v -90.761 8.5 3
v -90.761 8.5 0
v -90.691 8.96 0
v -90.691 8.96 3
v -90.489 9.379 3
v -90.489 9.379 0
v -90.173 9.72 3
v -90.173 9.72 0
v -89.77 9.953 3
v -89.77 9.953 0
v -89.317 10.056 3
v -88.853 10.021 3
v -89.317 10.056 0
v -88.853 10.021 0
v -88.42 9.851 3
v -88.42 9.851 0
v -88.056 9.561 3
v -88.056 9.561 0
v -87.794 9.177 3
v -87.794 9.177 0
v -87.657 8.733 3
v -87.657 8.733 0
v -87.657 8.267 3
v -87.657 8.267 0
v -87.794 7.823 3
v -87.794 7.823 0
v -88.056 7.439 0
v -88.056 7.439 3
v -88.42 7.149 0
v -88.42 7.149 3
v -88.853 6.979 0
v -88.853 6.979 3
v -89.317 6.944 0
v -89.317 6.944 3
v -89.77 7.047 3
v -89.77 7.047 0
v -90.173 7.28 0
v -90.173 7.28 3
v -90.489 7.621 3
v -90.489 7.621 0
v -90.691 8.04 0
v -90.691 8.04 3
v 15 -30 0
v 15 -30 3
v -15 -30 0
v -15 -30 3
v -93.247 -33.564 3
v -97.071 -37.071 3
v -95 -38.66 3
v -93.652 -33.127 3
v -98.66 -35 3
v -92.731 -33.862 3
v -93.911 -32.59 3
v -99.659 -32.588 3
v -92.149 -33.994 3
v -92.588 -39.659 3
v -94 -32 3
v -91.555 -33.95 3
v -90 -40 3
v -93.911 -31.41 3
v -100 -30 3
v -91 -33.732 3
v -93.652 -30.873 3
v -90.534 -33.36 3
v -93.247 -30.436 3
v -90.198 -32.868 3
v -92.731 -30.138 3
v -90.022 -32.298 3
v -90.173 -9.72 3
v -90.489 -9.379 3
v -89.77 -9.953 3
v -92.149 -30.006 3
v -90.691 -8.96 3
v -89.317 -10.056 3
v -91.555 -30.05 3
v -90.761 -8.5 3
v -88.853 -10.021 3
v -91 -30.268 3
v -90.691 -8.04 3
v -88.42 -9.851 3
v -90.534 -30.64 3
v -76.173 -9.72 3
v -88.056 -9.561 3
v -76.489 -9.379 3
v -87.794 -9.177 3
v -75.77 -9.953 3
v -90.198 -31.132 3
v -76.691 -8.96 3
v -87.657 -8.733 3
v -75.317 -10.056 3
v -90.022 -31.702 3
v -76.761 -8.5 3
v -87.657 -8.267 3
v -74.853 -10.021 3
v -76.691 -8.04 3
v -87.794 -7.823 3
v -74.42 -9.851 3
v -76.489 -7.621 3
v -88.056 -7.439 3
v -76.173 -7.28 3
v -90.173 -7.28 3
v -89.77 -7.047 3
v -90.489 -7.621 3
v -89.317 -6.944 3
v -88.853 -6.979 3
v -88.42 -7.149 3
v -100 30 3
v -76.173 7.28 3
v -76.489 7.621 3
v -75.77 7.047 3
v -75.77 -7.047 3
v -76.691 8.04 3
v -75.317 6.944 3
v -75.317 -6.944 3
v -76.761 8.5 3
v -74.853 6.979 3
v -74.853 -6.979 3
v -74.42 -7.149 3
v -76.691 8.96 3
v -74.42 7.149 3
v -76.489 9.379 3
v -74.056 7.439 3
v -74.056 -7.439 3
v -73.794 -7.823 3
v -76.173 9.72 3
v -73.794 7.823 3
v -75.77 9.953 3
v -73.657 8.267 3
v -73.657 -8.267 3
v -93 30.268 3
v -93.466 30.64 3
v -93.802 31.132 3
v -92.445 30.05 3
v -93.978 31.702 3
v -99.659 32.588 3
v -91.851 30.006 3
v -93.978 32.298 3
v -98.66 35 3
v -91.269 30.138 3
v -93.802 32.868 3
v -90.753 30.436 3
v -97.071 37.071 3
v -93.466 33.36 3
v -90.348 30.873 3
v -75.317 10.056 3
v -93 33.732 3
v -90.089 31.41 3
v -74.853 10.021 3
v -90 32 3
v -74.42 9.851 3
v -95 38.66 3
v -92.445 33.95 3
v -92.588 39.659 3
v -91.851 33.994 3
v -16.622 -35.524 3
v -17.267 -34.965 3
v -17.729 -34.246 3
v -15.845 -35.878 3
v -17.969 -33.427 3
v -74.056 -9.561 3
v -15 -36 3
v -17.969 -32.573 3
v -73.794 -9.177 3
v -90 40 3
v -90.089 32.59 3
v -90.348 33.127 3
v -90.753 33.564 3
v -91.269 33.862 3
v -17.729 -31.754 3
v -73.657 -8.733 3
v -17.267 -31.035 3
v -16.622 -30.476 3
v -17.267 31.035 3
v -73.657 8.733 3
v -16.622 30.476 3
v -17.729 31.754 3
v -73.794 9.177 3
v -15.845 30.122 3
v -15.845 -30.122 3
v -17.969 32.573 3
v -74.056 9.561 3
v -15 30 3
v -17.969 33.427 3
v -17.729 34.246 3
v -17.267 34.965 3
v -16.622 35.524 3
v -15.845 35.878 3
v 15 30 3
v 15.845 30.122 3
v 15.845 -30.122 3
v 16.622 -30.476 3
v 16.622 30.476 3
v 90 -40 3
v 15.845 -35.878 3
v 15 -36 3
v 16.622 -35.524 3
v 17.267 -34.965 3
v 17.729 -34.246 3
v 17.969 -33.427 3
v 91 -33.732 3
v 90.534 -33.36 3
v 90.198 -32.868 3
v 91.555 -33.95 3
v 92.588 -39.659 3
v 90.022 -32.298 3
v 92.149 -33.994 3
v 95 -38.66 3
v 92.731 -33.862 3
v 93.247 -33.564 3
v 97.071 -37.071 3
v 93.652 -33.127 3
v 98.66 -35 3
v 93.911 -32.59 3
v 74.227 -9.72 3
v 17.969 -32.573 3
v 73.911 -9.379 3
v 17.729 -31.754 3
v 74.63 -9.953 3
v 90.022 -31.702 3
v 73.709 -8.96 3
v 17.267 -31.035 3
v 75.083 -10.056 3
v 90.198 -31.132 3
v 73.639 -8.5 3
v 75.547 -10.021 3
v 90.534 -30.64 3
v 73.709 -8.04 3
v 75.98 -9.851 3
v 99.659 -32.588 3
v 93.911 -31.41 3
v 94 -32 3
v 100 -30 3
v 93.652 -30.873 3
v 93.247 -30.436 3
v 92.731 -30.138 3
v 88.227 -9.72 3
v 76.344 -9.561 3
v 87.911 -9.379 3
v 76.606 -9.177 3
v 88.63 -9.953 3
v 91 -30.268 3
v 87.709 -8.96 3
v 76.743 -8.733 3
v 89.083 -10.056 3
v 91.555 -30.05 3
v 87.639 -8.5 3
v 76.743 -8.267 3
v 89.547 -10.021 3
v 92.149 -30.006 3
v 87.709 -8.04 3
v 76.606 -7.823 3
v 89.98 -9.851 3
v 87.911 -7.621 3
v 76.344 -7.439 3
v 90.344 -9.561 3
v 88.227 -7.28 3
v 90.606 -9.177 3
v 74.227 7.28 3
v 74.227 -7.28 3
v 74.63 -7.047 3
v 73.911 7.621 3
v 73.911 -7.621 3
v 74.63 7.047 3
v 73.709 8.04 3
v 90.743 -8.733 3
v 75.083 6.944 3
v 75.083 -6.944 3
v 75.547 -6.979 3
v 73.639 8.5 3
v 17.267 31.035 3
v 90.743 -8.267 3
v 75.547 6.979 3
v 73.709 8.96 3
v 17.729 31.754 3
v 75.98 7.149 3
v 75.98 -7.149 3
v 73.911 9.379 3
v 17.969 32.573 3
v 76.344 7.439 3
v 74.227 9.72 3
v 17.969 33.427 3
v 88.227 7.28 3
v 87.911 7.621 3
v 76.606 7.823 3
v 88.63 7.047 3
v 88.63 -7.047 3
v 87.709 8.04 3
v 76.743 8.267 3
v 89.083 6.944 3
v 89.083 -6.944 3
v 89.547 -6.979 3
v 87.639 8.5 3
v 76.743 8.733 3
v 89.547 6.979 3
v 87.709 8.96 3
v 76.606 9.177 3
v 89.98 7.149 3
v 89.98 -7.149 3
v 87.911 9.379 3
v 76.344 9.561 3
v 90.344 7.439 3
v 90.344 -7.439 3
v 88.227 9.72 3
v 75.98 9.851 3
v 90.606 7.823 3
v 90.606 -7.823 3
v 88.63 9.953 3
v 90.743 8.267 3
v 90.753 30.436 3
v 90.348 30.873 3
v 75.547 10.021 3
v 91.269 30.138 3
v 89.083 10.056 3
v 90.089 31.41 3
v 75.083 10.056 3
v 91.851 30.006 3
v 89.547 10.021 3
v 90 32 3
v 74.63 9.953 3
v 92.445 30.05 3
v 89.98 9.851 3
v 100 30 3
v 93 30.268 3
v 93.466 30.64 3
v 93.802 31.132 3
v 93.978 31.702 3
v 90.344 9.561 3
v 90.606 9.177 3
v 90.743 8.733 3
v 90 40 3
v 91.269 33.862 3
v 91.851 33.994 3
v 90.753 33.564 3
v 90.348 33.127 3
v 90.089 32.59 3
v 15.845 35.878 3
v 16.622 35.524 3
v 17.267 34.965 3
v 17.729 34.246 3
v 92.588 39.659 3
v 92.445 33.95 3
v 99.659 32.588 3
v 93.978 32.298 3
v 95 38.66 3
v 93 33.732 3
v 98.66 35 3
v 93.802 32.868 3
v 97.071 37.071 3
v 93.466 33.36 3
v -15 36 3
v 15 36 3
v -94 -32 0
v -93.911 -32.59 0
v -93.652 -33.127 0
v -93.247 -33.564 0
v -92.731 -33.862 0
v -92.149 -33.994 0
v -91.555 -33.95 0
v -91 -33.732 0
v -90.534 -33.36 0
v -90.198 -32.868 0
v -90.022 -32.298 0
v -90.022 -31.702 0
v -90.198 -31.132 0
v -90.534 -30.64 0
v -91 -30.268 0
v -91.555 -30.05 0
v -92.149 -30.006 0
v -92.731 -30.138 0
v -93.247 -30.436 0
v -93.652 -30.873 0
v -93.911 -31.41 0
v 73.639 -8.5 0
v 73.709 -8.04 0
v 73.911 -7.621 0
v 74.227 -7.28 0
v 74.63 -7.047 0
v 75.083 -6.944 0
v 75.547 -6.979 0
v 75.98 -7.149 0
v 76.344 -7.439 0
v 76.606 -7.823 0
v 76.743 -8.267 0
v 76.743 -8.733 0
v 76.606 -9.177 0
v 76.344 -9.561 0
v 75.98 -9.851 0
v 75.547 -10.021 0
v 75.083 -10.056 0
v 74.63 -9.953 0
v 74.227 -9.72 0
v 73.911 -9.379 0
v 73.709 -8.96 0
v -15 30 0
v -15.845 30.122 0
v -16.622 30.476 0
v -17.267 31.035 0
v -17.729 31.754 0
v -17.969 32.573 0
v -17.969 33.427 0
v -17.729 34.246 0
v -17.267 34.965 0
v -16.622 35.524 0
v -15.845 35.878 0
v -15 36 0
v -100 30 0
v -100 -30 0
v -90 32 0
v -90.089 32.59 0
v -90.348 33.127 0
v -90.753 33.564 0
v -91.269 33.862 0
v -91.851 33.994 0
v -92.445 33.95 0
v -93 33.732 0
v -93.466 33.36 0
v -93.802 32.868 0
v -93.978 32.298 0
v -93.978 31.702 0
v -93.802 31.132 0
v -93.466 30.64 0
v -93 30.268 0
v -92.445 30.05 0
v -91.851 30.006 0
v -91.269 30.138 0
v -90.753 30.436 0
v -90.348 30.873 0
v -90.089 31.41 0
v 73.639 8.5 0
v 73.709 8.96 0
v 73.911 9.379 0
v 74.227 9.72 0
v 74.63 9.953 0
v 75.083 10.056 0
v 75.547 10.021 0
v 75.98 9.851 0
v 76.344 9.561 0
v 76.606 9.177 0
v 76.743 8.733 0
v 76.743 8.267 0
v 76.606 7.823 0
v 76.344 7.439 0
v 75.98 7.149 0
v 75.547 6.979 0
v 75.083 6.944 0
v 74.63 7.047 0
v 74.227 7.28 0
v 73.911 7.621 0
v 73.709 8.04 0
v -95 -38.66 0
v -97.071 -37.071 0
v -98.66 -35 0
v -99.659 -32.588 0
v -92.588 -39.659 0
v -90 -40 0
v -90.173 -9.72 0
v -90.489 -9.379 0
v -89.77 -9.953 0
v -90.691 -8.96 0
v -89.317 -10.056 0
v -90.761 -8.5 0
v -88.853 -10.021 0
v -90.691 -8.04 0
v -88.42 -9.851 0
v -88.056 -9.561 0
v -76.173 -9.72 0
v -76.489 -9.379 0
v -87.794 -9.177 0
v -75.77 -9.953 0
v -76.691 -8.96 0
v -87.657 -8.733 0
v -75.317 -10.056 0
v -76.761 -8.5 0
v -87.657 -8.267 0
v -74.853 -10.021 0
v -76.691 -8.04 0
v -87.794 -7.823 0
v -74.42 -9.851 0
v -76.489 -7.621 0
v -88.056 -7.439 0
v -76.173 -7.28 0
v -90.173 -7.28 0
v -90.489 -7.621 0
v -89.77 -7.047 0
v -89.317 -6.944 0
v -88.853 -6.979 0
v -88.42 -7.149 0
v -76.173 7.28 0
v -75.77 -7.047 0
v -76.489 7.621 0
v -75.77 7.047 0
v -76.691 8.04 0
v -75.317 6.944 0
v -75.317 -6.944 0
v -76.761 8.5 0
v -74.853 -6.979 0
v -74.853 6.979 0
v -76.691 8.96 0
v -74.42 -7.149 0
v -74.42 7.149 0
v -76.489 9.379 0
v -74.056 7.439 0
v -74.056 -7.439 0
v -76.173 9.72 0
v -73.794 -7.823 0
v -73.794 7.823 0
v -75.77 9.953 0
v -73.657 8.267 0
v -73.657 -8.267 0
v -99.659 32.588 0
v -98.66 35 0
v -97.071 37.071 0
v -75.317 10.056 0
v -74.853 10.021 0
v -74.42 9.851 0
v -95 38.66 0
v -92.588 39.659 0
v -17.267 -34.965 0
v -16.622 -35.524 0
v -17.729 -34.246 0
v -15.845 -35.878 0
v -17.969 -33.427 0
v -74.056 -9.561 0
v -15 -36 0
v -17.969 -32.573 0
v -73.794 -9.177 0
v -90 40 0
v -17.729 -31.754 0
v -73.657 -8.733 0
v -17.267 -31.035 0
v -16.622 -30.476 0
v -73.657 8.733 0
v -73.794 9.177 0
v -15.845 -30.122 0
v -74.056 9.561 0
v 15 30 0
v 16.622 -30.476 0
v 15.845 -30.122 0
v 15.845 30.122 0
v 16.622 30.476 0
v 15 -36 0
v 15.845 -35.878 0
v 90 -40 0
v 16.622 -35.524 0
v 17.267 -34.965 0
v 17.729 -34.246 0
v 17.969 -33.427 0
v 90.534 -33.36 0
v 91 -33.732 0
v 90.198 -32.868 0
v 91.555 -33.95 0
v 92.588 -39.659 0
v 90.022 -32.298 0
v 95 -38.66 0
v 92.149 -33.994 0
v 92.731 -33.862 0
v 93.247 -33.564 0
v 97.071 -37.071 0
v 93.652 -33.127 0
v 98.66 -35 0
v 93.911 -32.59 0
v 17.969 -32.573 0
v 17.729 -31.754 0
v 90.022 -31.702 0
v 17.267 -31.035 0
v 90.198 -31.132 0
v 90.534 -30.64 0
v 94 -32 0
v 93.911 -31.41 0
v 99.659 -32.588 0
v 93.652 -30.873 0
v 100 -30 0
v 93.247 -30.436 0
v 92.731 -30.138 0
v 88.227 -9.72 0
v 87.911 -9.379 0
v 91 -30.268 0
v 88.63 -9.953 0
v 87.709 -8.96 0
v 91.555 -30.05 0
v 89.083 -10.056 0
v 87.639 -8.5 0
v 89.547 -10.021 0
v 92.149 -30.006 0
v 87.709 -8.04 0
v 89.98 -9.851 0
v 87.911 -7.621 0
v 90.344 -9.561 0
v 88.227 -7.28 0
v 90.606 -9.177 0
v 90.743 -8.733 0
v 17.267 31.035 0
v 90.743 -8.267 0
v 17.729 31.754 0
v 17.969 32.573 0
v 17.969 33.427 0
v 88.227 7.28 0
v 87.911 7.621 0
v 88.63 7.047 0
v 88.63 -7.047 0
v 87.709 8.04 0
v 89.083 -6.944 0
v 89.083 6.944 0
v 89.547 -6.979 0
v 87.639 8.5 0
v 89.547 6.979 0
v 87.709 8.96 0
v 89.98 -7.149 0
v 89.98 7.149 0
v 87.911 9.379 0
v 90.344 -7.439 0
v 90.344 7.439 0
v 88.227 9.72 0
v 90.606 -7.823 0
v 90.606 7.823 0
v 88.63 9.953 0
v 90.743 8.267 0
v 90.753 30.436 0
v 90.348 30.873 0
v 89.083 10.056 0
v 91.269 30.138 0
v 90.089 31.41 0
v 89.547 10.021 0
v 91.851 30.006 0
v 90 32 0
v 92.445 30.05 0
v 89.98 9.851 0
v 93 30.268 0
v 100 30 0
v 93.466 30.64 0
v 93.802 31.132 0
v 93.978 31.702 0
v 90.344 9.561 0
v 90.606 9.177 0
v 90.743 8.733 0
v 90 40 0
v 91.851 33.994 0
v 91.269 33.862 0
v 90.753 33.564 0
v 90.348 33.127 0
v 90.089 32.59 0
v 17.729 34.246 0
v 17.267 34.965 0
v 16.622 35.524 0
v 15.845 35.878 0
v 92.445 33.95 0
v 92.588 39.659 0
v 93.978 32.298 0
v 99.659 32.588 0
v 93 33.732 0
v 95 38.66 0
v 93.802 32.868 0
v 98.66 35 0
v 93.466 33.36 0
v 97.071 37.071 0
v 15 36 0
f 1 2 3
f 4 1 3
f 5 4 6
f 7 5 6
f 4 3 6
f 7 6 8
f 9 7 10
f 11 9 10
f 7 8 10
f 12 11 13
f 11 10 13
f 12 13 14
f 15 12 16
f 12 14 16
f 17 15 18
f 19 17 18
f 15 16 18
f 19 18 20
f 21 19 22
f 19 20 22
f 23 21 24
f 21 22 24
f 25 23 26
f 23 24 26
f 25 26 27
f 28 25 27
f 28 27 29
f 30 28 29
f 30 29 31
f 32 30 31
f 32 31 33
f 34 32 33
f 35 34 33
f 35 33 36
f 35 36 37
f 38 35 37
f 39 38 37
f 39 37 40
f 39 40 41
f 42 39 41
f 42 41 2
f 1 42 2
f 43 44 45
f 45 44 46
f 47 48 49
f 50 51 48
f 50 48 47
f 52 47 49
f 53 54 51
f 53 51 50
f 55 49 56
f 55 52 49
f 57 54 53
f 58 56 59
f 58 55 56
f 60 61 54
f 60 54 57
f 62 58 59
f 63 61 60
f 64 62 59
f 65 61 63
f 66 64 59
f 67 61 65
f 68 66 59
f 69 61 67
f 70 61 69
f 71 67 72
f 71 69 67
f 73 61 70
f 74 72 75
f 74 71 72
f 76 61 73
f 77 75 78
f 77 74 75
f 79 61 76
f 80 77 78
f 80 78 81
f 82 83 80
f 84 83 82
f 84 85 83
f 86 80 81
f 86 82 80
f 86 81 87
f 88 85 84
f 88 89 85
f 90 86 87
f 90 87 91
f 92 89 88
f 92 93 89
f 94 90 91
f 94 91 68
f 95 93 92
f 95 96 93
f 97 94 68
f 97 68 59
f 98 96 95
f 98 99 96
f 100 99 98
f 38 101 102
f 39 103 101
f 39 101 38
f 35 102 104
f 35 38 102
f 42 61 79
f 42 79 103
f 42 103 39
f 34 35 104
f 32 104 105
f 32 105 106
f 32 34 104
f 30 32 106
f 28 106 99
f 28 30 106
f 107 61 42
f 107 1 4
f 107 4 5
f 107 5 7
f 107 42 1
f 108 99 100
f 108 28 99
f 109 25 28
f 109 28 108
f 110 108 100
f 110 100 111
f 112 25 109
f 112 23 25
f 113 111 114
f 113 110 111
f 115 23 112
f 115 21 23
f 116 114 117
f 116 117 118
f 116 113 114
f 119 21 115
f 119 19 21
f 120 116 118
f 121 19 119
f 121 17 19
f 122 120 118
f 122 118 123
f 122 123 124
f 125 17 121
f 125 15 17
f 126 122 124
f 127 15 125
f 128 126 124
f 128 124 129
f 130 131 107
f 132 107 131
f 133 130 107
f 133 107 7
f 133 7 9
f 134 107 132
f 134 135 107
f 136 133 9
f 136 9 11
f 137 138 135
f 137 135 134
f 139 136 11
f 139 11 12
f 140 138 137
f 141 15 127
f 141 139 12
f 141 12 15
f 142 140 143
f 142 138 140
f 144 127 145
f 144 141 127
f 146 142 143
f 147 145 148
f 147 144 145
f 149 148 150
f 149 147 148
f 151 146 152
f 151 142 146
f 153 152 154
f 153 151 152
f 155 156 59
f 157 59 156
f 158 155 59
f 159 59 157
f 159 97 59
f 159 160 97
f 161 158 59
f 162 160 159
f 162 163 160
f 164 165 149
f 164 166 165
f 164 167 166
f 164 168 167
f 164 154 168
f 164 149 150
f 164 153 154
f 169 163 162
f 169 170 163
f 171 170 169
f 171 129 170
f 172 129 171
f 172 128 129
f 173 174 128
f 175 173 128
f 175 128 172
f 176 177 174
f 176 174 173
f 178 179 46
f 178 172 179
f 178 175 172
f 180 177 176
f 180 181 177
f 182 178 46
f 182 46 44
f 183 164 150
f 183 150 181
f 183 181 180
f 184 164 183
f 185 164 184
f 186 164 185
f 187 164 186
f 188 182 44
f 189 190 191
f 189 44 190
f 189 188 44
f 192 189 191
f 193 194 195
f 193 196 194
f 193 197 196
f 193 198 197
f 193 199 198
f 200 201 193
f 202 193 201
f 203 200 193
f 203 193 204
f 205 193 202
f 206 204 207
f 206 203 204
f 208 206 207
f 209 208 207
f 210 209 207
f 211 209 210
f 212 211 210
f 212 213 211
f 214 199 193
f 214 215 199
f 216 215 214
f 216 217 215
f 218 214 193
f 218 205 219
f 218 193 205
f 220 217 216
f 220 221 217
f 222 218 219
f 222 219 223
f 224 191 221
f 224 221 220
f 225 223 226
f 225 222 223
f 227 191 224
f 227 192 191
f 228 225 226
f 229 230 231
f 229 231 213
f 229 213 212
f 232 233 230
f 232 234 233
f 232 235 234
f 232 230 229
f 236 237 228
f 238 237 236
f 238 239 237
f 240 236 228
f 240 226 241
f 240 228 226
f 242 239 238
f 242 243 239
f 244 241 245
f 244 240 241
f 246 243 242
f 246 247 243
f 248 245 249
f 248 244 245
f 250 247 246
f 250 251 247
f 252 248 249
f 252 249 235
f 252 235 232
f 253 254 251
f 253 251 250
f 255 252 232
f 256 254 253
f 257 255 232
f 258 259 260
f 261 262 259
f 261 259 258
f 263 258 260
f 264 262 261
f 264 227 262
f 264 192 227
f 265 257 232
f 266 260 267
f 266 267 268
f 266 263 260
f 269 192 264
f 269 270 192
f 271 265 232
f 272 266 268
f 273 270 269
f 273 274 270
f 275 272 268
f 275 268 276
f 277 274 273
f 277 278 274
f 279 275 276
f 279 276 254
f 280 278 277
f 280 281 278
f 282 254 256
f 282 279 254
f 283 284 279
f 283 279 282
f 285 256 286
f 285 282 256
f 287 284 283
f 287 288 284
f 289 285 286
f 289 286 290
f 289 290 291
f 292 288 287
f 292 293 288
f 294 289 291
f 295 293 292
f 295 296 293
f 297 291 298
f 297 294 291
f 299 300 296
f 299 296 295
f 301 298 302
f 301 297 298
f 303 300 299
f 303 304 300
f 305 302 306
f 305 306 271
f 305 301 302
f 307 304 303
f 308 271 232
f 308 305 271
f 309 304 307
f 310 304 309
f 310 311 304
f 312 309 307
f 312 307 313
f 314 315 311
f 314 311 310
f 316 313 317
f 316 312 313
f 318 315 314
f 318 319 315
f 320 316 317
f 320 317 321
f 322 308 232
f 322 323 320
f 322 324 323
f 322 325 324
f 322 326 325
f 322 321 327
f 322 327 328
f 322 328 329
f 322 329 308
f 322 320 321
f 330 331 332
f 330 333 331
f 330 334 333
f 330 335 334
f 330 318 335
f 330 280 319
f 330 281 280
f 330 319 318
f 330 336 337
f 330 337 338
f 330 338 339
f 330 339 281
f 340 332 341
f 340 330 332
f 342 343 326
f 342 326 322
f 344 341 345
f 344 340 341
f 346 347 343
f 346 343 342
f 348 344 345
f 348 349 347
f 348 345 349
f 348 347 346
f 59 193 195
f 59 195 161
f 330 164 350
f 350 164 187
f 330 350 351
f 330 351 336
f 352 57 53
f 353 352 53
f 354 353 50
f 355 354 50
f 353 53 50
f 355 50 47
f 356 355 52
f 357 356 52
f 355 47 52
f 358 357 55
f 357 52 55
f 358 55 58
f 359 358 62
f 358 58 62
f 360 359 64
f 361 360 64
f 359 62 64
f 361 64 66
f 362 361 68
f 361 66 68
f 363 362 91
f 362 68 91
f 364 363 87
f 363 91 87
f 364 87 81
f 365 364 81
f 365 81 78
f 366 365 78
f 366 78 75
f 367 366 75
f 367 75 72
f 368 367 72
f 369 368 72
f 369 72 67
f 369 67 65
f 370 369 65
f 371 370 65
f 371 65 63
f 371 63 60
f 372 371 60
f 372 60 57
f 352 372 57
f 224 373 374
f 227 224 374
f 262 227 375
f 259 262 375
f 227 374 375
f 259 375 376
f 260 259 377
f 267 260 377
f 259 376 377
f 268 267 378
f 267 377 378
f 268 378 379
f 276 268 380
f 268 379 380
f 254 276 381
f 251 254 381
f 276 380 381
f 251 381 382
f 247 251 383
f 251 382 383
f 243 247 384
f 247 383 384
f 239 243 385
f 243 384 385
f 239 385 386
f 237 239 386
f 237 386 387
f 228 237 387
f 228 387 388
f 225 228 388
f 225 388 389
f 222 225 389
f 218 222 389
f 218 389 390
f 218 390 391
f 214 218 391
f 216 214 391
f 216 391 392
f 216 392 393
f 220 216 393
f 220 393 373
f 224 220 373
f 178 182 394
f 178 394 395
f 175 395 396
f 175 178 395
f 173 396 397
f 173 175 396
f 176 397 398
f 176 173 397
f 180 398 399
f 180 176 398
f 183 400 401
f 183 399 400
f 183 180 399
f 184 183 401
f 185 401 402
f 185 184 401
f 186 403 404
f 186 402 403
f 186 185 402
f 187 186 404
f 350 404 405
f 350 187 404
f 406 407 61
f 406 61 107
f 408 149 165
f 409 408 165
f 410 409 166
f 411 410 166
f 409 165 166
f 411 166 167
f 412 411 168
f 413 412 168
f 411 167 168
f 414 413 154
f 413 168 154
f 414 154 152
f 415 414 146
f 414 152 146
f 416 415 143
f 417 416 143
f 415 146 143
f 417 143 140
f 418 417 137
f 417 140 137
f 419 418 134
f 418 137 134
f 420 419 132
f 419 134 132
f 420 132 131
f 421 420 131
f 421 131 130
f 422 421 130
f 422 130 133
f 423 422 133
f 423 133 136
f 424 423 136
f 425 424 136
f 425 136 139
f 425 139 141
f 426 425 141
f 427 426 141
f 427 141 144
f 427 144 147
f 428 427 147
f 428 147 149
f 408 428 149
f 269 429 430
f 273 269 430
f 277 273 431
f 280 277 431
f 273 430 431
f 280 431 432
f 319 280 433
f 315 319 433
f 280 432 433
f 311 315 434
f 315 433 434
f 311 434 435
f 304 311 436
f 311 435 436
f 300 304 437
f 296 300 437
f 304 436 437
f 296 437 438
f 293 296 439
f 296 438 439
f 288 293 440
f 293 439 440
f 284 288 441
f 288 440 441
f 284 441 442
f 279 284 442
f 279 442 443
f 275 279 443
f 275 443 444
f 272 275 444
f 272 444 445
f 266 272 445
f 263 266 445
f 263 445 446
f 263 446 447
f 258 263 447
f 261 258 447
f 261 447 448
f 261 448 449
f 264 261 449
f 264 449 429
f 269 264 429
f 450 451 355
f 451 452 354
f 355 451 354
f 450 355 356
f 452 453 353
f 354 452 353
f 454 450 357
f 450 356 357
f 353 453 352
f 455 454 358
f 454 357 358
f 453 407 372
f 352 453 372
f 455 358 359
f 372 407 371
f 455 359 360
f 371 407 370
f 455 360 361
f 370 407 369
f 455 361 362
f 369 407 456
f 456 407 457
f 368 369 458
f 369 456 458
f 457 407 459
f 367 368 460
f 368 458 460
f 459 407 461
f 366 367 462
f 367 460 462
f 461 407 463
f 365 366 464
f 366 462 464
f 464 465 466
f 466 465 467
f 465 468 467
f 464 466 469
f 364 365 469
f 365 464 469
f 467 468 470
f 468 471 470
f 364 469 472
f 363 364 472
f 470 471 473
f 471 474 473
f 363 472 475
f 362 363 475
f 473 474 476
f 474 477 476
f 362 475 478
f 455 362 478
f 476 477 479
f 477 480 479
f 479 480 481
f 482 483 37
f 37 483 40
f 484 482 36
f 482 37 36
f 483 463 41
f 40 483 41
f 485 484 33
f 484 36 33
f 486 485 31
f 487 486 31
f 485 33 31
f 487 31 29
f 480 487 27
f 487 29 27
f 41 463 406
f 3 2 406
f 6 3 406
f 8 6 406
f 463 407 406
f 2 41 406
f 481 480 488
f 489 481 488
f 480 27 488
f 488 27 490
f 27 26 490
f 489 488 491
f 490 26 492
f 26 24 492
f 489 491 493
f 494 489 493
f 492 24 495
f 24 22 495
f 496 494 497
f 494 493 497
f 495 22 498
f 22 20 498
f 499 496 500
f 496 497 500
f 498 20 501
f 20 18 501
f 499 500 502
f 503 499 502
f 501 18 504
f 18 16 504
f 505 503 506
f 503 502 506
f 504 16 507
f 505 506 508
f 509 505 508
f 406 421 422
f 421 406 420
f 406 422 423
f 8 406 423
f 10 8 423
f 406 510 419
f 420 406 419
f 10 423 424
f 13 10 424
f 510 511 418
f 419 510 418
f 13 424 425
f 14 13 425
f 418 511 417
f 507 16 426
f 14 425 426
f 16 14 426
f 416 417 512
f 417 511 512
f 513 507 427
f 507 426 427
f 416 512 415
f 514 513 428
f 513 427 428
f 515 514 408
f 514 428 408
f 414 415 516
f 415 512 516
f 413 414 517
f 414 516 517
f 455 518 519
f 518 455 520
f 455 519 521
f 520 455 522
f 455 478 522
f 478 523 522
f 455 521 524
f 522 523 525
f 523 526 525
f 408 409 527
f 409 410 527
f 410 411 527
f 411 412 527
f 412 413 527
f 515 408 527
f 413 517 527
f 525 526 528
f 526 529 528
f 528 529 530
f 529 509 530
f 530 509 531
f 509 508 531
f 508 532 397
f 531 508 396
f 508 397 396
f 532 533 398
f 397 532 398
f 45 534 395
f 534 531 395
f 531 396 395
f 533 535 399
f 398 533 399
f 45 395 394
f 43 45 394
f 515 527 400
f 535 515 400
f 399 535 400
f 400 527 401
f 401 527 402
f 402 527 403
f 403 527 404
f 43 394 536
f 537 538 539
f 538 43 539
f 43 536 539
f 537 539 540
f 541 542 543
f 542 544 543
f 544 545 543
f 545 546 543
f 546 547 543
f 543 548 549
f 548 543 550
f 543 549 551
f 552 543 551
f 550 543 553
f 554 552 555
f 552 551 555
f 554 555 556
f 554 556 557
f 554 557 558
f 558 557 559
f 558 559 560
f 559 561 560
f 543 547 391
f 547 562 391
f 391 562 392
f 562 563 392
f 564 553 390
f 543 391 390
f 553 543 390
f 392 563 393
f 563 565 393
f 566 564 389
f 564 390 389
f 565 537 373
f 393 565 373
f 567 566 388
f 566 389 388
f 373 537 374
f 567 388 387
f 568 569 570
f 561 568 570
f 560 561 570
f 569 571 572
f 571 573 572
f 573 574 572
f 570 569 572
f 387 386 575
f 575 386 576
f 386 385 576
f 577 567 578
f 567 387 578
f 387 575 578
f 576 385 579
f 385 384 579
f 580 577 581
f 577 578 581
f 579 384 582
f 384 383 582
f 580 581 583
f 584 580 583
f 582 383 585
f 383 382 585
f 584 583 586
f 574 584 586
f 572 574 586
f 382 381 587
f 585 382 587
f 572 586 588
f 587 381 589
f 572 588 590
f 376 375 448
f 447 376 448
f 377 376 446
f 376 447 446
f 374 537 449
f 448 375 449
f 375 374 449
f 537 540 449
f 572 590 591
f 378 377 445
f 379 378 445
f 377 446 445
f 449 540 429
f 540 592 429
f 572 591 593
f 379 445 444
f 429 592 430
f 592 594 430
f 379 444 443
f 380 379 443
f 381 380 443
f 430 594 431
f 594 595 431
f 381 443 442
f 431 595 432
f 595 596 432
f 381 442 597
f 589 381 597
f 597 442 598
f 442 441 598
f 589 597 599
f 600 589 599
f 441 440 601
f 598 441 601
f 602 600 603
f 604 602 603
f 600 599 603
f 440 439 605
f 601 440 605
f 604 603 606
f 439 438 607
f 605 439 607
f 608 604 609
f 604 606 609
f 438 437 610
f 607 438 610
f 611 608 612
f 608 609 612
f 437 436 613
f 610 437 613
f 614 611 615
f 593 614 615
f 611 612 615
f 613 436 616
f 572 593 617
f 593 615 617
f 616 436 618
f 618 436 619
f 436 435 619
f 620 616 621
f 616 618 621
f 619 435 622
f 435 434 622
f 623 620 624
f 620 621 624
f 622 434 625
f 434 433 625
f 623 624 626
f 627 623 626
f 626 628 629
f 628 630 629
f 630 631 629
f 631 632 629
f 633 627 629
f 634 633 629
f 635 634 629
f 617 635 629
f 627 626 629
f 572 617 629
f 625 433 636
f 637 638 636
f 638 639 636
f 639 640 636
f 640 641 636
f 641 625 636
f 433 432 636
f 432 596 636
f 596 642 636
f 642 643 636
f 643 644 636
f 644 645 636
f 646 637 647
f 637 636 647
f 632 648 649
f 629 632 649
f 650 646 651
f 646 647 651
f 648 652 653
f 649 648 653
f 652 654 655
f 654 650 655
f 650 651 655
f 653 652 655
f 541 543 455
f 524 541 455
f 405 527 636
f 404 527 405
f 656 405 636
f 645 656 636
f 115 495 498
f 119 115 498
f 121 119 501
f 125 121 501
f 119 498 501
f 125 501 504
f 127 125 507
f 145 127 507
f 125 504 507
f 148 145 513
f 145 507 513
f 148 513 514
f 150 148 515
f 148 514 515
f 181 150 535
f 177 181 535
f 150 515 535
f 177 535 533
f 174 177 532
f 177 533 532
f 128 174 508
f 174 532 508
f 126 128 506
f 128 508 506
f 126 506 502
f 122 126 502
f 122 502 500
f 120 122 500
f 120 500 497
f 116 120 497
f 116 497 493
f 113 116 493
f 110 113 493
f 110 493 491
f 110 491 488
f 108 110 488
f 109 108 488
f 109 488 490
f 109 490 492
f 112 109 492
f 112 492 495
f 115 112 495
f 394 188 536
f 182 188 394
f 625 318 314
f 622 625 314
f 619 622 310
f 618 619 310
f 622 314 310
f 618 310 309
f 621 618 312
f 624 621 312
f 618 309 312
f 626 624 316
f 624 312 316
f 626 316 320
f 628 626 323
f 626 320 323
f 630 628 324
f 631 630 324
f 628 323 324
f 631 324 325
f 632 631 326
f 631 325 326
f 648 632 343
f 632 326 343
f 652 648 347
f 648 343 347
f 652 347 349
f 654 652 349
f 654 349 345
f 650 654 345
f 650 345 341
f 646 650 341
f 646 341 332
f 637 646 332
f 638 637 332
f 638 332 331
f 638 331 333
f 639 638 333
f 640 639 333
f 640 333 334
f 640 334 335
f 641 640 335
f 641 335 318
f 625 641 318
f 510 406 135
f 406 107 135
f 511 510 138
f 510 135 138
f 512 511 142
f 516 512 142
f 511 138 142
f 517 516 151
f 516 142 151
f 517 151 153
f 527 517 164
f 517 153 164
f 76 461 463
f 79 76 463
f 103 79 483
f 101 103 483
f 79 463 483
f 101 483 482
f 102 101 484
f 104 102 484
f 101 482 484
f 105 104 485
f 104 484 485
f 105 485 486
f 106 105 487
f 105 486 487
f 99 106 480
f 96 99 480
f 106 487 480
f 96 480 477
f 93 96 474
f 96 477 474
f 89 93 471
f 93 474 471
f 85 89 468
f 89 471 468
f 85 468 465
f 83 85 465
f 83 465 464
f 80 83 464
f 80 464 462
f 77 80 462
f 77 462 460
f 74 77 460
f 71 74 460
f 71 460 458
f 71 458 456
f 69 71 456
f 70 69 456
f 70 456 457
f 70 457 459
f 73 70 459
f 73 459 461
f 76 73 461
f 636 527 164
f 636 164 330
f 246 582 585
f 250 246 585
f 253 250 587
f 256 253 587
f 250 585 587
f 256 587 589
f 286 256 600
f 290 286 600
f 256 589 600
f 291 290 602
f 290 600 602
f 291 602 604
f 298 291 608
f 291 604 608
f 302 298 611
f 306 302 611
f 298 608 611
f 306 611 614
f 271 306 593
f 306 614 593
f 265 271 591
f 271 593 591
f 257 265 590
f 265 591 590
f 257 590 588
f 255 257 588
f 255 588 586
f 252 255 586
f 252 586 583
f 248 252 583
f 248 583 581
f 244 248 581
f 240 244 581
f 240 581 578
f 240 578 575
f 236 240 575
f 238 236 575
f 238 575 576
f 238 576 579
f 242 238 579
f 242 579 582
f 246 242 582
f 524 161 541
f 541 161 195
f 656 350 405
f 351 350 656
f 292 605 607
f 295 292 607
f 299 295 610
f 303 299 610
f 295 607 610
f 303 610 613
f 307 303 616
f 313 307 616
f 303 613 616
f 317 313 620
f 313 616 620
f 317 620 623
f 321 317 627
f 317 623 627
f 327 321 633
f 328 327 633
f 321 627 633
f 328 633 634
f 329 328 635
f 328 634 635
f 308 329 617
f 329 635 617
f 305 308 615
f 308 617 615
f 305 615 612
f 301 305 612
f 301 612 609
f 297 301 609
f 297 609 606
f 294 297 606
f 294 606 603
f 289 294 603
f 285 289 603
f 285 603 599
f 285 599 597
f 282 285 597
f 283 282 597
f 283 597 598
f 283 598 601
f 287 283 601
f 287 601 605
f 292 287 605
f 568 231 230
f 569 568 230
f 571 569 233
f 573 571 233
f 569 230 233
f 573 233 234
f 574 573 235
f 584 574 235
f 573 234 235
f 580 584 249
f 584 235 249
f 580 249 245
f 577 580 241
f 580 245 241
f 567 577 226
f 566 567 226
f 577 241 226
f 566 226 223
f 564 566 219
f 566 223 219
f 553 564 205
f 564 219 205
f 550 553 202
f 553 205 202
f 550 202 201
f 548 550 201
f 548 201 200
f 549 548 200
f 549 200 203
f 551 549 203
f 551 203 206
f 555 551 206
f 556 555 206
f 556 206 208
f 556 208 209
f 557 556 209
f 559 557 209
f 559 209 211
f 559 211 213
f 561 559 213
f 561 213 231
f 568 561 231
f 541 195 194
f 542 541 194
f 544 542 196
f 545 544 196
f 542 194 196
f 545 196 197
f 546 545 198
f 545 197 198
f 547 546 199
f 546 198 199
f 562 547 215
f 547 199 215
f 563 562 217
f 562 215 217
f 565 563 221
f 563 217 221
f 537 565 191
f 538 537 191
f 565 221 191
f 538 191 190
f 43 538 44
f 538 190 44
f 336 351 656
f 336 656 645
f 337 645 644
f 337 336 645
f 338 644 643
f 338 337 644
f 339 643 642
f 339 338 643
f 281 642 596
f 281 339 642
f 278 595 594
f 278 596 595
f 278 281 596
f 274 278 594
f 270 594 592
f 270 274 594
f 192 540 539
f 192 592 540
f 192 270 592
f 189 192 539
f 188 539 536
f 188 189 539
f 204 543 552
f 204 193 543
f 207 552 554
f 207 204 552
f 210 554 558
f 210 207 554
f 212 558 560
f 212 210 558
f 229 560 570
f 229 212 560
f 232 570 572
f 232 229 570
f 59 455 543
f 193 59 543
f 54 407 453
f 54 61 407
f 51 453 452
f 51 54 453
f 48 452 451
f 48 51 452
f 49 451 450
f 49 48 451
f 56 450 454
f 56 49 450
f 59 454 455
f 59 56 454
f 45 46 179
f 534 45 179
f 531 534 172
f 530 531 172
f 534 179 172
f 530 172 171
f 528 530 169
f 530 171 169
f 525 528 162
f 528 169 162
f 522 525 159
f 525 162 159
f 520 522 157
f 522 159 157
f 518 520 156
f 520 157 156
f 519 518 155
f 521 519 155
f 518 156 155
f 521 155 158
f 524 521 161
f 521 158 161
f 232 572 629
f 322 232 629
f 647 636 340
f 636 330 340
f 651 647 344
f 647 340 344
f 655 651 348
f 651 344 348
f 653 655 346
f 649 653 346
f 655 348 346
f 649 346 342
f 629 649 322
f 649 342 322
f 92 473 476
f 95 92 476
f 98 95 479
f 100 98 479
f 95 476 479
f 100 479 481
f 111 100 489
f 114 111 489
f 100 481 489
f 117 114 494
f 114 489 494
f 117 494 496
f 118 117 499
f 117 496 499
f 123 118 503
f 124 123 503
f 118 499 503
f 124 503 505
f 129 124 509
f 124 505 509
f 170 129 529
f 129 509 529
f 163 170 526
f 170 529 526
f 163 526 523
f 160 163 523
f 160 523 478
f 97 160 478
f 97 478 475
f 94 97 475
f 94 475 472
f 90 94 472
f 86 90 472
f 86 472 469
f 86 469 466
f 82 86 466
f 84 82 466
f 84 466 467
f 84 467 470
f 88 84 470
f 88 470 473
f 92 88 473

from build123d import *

# Parameters (mm, degrees)
SKETCH1_W           = 200
SKETCH1_H           = 80
BOSS_EXTRUDE1_DEPTH = 3
SKETCH2_R           = 2
CUT_EXTRUDE1_DEPTH  = 108.745069493
FILLET1_R           = 10
SKETCH3_R           = 1.560556943
CUT_EXTRUDE2_DEPTH  = 108.745069493
CUT_EXTRUDE3_DEPTH  = 108.745069493


with BuildPart() as part:
    # Sketch1 → Boss-Extrude1 (new body)
    with BuildSketch(Plane.XY):
        Rectangle(SKETCH1_W, SKETCH1_H)
    extrude(amount=BOSS_EXTRUDE1_DEPTH)

    # Sketch2 → Cut-Extrude1 (cut, through all)
    with BuildSketch(Plane.XY.offset(3)):
        with Locations((-92, 32)):
            Circle(SKETCH2_R)
        with Locations(Location((-92, -32, 0), (0, 0, 180))):
            Circle(SKETCH2_R)
        with Locations((92, -32)):
            Circle(SKETCH2_R)
        with Locations(Location((92, 32, 0), (0, 0, 180))):
            Circle(SKETCH2_R)
    extrude(amount=-CUT_EXTRUDE1_DEPTH, mode=Mode.SUBTRACT)

    # Fillet1
    fillet1_edges = [part.edges().sort_by_distance(p)[0] for p in [
        (100, -40, 1.5),
        (-100, -40, 1.5),
        (-100, 40, 1.5),
        (100, 40, 1.5),
    ]]
    fillet(fillet1_edges, radius=FILLET1_R)

    # Sketch3 → Cut-Extrude2 (cut, through all)
    with BuildSketch(Plane(origin=(0, 0, 0), x_dir=(-1, 0, 0), z_dir=(0, 0, -1))):
        with Locations((89.2, -8.5)):
            Circle(SKETCH3_R)
        with Locations((75.2, -8.5)):
            Circle(SKETCH3_R)
        with Locations((75.2, 8.5)):
            Circle(SKETCH3_R)
        with Locations((89.2, 8.5)):
            Circle(SKETCH3_R)
        with Locations((-89.2, -8.5)):
            Circle(SKETCH3_R)
        with Locations((-75.2, -8.5)):
            Circle(SKETCH3_R)
        with Locations((-89.2, 8.5)):
            Circle(SKETCH3_R)
        with Locations((-75.2, 8.5)):
            Circle(SKETCH3_R)
    extrude(amount=-CUT_EXTRUDE2_DEPTH, mode=Mode.SUBTRACT)

    # Sketch4 → Cut-Extrude3 (cut, through all)
    with BuildSketch(Plane.XY.offset(3)):
        with BuildLine():
            Line((15, 30), (-15, 30))
            ThreePointArc((-15, 30), (-18, 33), (-15, 36))
            Line((-15, 36), (15, 36))
            ThreePointArc((15, 36), (18, 33), (15, 30))
        make_face()
        with BuildLine():
            Line((15, -30), (-15, -30))
            ThreePointArc((-15, -30), (-18, -33), (-15, -36))
            Line((-15, -36), (15, -36))
            ThreePointArc((15, -36), (18, -33), (15, -30))
        make_face()
    extrude(amount=-CUT_EXTRUDE3_DEPTH, mode=Mode.SUBTRACT)


solid = part.part
